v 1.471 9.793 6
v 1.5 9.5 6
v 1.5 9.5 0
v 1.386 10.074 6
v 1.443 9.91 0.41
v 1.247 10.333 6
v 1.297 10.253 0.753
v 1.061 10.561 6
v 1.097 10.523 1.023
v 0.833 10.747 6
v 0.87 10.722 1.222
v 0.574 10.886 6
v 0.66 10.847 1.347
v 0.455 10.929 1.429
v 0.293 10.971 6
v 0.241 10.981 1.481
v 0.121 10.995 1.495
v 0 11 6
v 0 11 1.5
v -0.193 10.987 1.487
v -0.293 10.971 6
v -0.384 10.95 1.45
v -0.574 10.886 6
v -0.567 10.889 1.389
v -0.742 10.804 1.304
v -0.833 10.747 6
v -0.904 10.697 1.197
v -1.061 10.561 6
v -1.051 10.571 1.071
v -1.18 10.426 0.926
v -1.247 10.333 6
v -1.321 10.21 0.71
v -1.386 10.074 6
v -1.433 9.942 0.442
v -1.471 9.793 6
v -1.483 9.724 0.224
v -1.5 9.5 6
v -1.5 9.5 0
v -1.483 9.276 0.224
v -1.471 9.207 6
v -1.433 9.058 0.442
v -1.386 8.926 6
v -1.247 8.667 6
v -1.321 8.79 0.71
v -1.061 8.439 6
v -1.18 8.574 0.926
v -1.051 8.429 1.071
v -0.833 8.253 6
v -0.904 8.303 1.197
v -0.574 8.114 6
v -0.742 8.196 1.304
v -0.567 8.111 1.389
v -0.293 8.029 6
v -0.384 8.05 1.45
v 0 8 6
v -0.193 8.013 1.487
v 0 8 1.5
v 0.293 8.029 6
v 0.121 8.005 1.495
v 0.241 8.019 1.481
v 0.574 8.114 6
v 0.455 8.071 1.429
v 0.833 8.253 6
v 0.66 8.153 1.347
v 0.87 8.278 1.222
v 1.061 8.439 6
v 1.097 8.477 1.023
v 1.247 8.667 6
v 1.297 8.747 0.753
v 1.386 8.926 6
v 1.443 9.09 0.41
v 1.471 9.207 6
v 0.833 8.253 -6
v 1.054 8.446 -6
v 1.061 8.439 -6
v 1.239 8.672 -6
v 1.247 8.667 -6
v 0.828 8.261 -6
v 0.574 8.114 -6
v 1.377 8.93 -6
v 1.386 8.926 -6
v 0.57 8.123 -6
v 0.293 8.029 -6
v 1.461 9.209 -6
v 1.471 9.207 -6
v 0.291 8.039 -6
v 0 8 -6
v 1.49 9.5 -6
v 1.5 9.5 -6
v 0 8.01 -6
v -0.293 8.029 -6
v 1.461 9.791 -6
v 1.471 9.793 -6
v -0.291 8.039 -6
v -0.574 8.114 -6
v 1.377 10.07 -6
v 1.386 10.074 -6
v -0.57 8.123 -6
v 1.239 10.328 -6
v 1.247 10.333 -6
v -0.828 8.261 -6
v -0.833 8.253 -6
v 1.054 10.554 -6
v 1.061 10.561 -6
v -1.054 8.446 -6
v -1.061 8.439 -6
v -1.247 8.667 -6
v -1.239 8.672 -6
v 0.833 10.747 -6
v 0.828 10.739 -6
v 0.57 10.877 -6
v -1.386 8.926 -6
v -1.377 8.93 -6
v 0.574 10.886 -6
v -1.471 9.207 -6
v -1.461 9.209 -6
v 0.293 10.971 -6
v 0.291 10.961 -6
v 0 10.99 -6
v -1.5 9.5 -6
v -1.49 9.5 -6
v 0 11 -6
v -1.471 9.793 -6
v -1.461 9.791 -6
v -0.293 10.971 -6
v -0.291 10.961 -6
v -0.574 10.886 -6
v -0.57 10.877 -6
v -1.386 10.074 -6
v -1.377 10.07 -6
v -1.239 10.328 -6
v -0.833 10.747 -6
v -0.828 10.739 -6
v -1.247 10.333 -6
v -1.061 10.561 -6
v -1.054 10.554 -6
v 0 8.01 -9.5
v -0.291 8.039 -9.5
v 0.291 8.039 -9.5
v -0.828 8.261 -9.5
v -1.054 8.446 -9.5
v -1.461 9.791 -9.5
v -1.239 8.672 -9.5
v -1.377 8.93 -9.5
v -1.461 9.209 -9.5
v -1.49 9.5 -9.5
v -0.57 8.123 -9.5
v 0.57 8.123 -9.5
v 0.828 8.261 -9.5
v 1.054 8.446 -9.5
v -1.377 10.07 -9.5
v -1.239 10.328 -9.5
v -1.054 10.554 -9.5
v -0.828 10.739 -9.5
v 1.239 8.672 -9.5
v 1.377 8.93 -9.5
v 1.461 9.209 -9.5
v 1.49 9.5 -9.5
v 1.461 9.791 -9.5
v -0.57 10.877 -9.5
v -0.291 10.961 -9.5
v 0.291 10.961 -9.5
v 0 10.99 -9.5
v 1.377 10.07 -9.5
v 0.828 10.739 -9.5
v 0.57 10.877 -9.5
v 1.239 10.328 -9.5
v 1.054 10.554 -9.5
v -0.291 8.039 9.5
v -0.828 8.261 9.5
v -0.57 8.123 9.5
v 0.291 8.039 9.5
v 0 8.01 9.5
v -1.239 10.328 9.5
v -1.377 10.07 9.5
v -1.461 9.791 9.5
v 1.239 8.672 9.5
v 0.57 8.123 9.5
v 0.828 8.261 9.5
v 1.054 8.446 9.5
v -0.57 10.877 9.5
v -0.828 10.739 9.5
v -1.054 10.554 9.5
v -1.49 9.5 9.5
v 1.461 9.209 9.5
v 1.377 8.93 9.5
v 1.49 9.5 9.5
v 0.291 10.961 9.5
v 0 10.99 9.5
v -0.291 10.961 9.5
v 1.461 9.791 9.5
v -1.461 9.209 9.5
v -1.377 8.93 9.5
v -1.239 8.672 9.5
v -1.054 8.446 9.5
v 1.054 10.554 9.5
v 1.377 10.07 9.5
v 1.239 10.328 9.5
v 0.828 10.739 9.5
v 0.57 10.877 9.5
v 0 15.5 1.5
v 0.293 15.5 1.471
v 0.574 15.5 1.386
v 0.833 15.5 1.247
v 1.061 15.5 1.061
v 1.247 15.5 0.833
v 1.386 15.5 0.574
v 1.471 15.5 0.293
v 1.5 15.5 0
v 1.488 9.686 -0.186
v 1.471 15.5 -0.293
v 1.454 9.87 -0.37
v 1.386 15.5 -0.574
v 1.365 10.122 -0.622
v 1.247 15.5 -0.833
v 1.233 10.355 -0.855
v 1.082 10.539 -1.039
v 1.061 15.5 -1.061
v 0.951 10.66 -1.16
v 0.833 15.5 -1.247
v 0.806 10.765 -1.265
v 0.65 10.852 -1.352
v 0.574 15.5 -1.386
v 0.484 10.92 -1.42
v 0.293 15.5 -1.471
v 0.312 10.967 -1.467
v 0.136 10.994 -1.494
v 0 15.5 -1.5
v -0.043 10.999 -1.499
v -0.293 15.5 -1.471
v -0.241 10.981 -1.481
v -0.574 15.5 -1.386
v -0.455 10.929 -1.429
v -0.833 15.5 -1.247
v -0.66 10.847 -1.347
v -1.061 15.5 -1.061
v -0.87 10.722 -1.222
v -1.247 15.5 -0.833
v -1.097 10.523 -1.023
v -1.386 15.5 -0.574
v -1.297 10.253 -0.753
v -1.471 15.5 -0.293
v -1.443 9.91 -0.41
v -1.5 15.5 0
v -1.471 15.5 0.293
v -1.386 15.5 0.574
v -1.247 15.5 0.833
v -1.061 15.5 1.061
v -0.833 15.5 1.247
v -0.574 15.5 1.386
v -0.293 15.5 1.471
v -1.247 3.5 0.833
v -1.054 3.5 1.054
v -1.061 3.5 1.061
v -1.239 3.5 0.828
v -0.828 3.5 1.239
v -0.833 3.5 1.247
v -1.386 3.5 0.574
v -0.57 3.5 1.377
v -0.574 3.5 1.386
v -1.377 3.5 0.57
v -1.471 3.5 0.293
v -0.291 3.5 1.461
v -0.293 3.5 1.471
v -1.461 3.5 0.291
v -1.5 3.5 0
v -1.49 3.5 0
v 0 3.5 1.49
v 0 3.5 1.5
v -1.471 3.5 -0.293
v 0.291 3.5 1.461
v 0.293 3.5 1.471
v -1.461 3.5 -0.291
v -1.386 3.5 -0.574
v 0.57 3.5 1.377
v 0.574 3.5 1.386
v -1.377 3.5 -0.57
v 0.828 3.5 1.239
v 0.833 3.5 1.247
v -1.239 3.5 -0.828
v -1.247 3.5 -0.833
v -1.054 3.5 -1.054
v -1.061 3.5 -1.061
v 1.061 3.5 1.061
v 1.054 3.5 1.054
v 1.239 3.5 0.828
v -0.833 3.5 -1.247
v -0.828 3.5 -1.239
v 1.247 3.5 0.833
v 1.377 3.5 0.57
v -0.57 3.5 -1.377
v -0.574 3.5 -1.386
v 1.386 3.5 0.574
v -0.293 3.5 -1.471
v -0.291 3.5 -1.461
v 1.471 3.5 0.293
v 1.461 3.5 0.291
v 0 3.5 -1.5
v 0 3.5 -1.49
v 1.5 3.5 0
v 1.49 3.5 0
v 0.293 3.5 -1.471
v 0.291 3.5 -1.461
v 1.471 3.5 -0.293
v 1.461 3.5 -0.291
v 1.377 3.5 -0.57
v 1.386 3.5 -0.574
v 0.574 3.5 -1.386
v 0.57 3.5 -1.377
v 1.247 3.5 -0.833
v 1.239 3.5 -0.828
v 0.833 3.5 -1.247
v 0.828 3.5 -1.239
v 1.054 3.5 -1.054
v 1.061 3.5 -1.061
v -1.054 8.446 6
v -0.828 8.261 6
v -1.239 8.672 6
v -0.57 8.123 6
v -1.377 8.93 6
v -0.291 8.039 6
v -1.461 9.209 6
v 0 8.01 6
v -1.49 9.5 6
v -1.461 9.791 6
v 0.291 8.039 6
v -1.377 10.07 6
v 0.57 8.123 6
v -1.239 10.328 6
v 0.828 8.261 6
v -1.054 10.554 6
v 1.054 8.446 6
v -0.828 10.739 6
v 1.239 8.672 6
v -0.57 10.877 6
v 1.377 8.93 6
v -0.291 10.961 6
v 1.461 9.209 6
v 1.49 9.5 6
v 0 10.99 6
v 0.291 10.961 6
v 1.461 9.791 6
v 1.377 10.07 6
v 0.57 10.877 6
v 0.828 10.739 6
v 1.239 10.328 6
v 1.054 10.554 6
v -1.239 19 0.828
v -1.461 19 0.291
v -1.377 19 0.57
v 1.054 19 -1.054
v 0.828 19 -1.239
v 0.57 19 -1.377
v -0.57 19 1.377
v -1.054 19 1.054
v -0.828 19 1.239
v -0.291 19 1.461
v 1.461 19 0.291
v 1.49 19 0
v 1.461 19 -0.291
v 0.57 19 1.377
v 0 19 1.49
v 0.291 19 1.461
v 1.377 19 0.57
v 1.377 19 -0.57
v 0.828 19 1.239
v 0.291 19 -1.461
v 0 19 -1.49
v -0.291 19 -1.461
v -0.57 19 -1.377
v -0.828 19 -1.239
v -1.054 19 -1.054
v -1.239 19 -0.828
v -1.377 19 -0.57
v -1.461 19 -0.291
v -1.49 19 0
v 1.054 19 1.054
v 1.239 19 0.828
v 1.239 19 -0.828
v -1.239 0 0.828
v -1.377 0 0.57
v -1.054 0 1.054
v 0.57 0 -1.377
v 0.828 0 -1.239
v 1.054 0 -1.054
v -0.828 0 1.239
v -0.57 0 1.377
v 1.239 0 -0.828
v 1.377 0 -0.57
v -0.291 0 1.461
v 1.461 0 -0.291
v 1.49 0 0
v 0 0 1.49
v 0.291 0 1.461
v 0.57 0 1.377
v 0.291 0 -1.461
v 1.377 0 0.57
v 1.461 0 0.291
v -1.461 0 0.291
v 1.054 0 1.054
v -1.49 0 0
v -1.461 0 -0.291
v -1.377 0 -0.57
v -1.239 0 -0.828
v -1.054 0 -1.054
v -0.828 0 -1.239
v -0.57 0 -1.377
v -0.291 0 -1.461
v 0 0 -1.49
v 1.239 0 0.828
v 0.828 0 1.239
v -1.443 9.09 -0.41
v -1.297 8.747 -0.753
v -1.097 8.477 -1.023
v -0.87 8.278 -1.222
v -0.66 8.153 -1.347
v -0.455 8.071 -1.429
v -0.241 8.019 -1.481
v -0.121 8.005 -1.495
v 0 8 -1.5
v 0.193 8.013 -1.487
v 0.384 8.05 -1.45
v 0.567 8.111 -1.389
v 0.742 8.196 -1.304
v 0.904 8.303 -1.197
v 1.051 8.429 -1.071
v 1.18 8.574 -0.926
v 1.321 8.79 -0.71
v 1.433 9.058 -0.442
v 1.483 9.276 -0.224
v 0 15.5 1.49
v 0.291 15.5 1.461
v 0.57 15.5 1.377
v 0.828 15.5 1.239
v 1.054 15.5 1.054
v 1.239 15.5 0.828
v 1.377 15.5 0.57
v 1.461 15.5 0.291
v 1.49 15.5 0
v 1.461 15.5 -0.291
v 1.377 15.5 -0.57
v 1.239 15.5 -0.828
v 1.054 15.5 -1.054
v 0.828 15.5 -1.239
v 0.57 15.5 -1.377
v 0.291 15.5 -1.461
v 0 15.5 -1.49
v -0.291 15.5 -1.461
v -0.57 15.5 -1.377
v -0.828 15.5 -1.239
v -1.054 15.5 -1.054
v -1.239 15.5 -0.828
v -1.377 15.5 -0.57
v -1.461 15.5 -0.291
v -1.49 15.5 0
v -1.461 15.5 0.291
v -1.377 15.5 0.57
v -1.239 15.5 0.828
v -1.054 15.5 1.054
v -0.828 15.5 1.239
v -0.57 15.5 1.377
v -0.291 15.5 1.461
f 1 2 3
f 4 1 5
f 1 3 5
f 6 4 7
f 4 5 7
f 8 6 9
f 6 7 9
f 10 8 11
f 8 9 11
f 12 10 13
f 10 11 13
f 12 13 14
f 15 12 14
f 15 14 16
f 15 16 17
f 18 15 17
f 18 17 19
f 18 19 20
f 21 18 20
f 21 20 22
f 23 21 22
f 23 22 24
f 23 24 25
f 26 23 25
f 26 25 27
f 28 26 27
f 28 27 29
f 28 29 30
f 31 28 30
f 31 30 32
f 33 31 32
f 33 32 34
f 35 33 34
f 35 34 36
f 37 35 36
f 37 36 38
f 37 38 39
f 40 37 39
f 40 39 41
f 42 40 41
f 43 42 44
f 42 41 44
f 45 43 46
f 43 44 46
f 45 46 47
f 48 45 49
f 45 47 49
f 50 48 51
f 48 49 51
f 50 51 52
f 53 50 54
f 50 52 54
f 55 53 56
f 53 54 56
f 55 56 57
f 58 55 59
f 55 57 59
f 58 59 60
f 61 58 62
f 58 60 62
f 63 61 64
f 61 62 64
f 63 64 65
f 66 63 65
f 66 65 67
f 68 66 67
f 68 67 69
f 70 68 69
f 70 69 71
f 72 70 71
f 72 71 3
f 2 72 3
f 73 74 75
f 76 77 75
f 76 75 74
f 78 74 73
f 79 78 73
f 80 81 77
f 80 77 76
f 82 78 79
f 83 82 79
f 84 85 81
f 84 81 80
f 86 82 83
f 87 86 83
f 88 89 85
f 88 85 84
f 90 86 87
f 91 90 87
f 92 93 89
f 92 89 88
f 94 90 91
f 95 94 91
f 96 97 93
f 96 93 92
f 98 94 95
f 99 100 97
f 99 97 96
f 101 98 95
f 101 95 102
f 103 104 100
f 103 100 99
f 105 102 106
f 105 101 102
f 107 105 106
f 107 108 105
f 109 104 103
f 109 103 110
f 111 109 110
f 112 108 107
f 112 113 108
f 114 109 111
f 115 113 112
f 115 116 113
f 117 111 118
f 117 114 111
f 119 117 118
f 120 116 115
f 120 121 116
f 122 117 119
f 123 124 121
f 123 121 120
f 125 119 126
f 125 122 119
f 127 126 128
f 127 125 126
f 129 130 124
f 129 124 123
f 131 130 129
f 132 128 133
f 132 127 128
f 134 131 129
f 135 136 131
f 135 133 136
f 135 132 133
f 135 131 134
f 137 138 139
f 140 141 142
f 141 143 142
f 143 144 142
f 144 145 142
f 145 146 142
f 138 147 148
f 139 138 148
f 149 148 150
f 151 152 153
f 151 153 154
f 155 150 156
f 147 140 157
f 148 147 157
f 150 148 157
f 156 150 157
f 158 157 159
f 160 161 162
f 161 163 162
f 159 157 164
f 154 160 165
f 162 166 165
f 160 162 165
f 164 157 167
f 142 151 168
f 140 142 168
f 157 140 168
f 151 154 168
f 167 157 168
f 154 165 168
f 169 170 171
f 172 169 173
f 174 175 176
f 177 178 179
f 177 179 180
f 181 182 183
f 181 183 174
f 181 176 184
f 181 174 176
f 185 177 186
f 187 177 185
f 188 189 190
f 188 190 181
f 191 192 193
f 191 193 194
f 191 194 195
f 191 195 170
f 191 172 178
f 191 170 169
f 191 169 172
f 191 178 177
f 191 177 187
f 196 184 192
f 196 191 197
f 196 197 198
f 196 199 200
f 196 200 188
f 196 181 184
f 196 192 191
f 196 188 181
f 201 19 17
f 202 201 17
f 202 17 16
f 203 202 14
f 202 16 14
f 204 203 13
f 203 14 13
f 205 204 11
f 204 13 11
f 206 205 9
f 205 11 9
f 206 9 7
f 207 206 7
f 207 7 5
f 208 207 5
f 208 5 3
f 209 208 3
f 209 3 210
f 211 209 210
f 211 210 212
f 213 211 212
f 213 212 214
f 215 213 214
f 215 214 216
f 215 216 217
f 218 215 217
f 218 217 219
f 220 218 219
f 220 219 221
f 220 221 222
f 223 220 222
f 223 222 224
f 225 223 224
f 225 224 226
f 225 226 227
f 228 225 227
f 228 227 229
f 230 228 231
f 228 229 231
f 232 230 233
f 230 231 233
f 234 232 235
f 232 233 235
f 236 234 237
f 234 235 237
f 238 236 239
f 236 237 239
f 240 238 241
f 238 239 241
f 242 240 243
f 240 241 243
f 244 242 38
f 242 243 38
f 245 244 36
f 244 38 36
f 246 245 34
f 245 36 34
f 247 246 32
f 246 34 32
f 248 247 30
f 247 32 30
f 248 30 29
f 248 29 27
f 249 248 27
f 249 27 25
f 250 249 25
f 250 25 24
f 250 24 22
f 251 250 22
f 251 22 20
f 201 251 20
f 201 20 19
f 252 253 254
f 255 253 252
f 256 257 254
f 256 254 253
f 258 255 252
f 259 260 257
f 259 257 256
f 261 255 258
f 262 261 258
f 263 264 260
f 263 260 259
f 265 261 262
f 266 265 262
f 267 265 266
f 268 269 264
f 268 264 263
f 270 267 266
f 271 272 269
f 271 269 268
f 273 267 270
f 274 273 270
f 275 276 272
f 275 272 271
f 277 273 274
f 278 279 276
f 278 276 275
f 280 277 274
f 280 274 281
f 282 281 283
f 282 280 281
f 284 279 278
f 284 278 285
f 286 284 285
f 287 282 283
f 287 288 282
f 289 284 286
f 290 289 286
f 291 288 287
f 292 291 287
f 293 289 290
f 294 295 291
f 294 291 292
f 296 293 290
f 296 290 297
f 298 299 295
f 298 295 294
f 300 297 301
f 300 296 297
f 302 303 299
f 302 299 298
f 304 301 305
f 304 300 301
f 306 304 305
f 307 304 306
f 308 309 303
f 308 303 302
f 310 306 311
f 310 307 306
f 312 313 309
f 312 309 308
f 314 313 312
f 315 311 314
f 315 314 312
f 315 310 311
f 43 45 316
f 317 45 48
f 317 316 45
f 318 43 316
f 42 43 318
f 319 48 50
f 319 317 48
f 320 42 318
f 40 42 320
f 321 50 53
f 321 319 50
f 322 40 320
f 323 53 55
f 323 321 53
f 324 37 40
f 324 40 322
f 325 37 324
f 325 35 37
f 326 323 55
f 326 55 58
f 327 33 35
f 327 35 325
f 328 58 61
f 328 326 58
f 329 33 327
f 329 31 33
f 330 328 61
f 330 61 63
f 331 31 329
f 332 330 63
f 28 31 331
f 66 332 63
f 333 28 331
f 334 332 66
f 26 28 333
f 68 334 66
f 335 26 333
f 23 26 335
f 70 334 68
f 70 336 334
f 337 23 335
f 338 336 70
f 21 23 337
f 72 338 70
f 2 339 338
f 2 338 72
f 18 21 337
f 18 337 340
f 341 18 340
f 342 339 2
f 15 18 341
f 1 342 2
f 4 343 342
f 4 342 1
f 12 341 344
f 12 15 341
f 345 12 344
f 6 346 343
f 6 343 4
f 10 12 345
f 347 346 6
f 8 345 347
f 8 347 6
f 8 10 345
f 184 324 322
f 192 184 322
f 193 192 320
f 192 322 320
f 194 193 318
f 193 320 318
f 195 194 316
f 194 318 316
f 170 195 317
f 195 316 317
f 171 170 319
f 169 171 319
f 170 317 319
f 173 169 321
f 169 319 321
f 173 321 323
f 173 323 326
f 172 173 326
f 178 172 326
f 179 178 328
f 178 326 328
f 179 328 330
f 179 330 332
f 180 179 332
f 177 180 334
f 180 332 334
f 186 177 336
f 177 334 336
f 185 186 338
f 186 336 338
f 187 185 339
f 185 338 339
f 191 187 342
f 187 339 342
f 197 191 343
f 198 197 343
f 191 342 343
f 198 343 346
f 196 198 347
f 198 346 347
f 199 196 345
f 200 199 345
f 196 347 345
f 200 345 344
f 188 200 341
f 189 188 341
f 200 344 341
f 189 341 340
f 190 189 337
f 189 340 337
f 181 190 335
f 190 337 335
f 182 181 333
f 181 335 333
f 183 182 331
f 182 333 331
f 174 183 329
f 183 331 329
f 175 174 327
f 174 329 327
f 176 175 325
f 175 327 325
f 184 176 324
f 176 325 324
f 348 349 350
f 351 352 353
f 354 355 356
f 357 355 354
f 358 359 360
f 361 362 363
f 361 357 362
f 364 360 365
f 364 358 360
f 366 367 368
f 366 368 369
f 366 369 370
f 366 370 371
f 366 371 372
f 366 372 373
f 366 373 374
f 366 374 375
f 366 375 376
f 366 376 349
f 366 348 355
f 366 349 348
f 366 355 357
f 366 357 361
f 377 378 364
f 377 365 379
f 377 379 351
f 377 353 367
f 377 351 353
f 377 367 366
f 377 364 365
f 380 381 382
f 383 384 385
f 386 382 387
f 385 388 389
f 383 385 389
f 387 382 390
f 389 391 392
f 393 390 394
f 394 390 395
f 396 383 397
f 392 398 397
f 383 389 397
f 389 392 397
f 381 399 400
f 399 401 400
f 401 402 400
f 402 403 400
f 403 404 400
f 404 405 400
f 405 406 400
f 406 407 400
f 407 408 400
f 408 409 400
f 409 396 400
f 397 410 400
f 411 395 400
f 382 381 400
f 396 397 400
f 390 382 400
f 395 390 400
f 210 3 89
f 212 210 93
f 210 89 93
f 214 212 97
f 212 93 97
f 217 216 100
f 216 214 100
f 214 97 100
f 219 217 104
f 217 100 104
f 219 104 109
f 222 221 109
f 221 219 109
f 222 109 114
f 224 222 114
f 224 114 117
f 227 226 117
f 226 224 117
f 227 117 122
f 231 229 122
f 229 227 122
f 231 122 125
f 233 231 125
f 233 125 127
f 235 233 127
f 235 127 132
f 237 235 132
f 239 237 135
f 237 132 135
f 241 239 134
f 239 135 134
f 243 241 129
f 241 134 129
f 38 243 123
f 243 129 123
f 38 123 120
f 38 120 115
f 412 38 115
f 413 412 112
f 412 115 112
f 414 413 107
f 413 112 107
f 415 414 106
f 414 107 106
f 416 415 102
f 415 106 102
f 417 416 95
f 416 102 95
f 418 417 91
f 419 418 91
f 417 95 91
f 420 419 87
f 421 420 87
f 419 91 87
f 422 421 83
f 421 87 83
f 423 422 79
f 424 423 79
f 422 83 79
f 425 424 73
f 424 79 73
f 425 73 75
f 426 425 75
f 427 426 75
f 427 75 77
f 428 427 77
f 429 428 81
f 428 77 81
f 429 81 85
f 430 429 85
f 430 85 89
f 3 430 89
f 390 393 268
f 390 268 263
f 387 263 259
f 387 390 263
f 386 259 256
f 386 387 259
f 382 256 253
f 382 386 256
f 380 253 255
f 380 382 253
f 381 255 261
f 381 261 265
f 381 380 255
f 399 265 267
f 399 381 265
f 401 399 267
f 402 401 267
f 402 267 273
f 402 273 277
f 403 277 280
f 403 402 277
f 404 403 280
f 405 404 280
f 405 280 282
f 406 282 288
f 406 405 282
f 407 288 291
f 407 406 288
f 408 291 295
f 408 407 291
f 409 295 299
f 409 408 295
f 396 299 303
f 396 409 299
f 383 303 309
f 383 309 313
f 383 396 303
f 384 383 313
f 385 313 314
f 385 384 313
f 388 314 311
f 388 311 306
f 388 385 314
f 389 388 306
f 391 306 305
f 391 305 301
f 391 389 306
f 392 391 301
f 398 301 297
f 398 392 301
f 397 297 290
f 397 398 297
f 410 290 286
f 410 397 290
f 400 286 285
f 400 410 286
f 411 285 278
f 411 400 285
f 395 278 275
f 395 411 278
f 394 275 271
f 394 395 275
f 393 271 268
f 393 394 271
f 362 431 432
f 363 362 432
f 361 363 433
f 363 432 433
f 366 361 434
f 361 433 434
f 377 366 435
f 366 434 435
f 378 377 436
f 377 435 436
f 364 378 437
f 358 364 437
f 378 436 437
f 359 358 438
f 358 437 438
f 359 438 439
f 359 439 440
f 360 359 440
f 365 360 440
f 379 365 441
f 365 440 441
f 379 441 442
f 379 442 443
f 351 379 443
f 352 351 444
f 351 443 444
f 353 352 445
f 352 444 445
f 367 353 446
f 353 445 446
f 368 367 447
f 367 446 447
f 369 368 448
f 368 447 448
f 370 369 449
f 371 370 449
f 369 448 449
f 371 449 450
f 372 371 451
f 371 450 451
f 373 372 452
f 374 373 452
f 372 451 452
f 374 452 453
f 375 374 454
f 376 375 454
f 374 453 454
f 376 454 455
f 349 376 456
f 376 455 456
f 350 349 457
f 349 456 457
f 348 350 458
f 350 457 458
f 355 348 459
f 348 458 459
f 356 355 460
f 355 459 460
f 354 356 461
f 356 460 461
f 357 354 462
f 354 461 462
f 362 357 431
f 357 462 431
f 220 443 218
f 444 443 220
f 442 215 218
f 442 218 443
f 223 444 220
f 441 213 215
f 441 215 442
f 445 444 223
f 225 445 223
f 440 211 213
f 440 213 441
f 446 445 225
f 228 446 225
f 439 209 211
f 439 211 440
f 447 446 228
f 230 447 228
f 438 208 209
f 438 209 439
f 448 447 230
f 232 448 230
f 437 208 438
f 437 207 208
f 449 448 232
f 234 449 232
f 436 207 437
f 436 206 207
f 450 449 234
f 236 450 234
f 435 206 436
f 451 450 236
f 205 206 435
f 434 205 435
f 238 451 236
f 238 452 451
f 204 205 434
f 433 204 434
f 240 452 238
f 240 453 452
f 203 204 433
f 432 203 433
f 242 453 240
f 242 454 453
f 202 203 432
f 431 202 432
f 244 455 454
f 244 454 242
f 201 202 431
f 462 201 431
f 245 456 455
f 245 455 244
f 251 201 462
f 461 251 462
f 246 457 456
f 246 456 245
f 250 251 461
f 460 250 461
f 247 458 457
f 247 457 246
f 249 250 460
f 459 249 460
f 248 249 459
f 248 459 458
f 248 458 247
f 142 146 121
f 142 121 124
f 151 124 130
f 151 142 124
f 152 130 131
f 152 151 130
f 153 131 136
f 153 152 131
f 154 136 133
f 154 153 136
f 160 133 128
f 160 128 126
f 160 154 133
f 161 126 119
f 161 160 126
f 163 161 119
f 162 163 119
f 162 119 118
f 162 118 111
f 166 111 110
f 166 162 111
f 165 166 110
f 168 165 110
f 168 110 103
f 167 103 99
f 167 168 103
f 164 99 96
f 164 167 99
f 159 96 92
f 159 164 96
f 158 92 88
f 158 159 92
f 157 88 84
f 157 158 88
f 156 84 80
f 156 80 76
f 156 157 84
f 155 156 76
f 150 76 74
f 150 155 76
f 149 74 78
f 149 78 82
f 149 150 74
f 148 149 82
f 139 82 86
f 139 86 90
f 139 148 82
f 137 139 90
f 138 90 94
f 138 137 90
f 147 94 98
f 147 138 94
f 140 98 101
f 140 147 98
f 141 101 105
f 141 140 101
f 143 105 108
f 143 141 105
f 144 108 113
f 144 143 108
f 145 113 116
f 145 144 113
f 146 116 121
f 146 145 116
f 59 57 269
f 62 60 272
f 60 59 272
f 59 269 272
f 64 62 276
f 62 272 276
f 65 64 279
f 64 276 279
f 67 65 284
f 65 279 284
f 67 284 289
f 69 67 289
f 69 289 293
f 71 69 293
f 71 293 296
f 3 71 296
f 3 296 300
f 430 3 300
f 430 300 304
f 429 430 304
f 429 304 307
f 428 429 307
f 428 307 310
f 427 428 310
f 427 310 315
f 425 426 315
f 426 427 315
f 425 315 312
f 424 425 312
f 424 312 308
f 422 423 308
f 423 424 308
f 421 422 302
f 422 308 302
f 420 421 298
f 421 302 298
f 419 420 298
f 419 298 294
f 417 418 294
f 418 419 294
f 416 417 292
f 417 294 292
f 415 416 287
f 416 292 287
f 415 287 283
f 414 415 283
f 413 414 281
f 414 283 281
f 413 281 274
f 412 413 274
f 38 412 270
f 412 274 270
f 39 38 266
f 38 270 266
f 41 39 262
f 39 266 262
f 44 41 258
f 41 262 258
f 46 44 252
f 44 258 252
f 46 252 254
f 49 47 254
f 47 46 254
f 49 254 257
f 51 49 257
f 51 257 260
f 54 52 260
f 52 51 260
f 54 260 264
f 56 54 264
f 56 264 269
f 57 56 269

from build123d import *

# Parameters (mm, degrees)
SKETCH1_R                = 1.5
BOSS_EXTRUDE1_DEPTH      = 19
BOSS_EXTRUDE2_DEPTH      = 9.5
BOSS_EXTRUDE2_DEPTH_BACK = 9.5
SKETCH2_R                = 1.5
SKETCH3_R                = 1.5
SKETCH3_R_2              = 1.49
CUT_EXTRUDE1_DEPTH       = 3.5
CUT_EXTRUDE2_START       = -3.5
SKETCH4_R                = 1.5
SKETCH4_R_2              = 1.49
CUT_EXTRUDE2_DEPTH       = 3.5
CUT_EXTRUDE3_START       = -3.5
SKETCH5_R                = 1.5
SKETCH5_R_2              = 1.49
CUT_EXTRUDE3_DEPTH       = 3.5
SKETCH6_R                = 1.5
SKETCH6_R_2              = 1.49
CUT_EXTRUDE4_DEPTH       = 3.5


with BuildPart() as part:
    # Sketch1 → Boss-Extrude1 (new body)
    with BuildSketch(Plane(origin=(0, 0, 0), x_dir=(1, 0, 0), z_dir=(0, 1, 0))):
        Circle(SKETCH1_R)
    extrude(amount=BOSS_EXTRUDE1_DEPTH)

    # Sketch2 → Boss-Extrude2 (add, two sides: drawn at the far end of the back side and taken through both)
    with BuildSketch(Plane.XY.offset(-BOSS_EXTRUDE2_DEPTH_BACK)):
        with Locations((0, 9.5)):
            Circle(SKETCH2_R)
    extrude(amount=BOSS_EXTRUDE2_DEPTH + BOSS_EXTRUDE2_DEPTH_BACK)

    # Sketch3 → Cut-Extrude1 (cut)
    with BuildSketch(Plane(origin=(0, 0, -9.5), x_dir=(-1, 0, 0), z_dir=(0, 0, -1))):
        with Locations((0, 9.5)):
            Circle(SKETCH3_R)
        with Locations((0, 9.5)):
            Circle(SKETCH3_R_2, mode=Mode.SUBTRACT)
    extrude(amount=-CUT_EXTRUDE1_DEPTH, mode=Mode.SUBTRACT)

    # Sketch4 → Cut-Extrude2 (cut)
    with BuildSketch(Plane.XY.offset(9.5).offset(CUT_EXTRUDE2_START)):
        with Locations((0, 9.5)):
            Circle(SKETCH4_R)
        with Locations((0, 9.5)):
            Circle(SKETCH4_R_2, mode=Mode.SUBTRACT)
    extrude(amount=CUT_EXTRUDE2_DEPTH, mode=Mode.SUBTRACT)

    # Sketch5 → Cut-Extrude3 (cut)
    with BuildSketch(Plane(origin=(0, 19, 0), x_dir=(1, 0, 0), z_dir=(0, 1, 0)).offset(CUT_EXTRUDE3_START)):
        Circle(SKETCH5_R)
        Circle(SKETCH5_R_2, mode=Mode.SUBTRACT)
    extrude(amount=CUT_EXTRUDE3_DEPTH, mode=Mode.SUBTRACT)

    # Sketch6 → Cut-Extrude4 (cut)
    with BuildSketch(Plane.XZ):
        Circle(SKETCH6_R)
        Circle(SKETCH6_R_2, mode=Mode.SUBTRACT)
    extrude(amount=-CUT_EXTRUDE4_DEPTH, mode=Mode.SUBTRACT)


solid = part.part
